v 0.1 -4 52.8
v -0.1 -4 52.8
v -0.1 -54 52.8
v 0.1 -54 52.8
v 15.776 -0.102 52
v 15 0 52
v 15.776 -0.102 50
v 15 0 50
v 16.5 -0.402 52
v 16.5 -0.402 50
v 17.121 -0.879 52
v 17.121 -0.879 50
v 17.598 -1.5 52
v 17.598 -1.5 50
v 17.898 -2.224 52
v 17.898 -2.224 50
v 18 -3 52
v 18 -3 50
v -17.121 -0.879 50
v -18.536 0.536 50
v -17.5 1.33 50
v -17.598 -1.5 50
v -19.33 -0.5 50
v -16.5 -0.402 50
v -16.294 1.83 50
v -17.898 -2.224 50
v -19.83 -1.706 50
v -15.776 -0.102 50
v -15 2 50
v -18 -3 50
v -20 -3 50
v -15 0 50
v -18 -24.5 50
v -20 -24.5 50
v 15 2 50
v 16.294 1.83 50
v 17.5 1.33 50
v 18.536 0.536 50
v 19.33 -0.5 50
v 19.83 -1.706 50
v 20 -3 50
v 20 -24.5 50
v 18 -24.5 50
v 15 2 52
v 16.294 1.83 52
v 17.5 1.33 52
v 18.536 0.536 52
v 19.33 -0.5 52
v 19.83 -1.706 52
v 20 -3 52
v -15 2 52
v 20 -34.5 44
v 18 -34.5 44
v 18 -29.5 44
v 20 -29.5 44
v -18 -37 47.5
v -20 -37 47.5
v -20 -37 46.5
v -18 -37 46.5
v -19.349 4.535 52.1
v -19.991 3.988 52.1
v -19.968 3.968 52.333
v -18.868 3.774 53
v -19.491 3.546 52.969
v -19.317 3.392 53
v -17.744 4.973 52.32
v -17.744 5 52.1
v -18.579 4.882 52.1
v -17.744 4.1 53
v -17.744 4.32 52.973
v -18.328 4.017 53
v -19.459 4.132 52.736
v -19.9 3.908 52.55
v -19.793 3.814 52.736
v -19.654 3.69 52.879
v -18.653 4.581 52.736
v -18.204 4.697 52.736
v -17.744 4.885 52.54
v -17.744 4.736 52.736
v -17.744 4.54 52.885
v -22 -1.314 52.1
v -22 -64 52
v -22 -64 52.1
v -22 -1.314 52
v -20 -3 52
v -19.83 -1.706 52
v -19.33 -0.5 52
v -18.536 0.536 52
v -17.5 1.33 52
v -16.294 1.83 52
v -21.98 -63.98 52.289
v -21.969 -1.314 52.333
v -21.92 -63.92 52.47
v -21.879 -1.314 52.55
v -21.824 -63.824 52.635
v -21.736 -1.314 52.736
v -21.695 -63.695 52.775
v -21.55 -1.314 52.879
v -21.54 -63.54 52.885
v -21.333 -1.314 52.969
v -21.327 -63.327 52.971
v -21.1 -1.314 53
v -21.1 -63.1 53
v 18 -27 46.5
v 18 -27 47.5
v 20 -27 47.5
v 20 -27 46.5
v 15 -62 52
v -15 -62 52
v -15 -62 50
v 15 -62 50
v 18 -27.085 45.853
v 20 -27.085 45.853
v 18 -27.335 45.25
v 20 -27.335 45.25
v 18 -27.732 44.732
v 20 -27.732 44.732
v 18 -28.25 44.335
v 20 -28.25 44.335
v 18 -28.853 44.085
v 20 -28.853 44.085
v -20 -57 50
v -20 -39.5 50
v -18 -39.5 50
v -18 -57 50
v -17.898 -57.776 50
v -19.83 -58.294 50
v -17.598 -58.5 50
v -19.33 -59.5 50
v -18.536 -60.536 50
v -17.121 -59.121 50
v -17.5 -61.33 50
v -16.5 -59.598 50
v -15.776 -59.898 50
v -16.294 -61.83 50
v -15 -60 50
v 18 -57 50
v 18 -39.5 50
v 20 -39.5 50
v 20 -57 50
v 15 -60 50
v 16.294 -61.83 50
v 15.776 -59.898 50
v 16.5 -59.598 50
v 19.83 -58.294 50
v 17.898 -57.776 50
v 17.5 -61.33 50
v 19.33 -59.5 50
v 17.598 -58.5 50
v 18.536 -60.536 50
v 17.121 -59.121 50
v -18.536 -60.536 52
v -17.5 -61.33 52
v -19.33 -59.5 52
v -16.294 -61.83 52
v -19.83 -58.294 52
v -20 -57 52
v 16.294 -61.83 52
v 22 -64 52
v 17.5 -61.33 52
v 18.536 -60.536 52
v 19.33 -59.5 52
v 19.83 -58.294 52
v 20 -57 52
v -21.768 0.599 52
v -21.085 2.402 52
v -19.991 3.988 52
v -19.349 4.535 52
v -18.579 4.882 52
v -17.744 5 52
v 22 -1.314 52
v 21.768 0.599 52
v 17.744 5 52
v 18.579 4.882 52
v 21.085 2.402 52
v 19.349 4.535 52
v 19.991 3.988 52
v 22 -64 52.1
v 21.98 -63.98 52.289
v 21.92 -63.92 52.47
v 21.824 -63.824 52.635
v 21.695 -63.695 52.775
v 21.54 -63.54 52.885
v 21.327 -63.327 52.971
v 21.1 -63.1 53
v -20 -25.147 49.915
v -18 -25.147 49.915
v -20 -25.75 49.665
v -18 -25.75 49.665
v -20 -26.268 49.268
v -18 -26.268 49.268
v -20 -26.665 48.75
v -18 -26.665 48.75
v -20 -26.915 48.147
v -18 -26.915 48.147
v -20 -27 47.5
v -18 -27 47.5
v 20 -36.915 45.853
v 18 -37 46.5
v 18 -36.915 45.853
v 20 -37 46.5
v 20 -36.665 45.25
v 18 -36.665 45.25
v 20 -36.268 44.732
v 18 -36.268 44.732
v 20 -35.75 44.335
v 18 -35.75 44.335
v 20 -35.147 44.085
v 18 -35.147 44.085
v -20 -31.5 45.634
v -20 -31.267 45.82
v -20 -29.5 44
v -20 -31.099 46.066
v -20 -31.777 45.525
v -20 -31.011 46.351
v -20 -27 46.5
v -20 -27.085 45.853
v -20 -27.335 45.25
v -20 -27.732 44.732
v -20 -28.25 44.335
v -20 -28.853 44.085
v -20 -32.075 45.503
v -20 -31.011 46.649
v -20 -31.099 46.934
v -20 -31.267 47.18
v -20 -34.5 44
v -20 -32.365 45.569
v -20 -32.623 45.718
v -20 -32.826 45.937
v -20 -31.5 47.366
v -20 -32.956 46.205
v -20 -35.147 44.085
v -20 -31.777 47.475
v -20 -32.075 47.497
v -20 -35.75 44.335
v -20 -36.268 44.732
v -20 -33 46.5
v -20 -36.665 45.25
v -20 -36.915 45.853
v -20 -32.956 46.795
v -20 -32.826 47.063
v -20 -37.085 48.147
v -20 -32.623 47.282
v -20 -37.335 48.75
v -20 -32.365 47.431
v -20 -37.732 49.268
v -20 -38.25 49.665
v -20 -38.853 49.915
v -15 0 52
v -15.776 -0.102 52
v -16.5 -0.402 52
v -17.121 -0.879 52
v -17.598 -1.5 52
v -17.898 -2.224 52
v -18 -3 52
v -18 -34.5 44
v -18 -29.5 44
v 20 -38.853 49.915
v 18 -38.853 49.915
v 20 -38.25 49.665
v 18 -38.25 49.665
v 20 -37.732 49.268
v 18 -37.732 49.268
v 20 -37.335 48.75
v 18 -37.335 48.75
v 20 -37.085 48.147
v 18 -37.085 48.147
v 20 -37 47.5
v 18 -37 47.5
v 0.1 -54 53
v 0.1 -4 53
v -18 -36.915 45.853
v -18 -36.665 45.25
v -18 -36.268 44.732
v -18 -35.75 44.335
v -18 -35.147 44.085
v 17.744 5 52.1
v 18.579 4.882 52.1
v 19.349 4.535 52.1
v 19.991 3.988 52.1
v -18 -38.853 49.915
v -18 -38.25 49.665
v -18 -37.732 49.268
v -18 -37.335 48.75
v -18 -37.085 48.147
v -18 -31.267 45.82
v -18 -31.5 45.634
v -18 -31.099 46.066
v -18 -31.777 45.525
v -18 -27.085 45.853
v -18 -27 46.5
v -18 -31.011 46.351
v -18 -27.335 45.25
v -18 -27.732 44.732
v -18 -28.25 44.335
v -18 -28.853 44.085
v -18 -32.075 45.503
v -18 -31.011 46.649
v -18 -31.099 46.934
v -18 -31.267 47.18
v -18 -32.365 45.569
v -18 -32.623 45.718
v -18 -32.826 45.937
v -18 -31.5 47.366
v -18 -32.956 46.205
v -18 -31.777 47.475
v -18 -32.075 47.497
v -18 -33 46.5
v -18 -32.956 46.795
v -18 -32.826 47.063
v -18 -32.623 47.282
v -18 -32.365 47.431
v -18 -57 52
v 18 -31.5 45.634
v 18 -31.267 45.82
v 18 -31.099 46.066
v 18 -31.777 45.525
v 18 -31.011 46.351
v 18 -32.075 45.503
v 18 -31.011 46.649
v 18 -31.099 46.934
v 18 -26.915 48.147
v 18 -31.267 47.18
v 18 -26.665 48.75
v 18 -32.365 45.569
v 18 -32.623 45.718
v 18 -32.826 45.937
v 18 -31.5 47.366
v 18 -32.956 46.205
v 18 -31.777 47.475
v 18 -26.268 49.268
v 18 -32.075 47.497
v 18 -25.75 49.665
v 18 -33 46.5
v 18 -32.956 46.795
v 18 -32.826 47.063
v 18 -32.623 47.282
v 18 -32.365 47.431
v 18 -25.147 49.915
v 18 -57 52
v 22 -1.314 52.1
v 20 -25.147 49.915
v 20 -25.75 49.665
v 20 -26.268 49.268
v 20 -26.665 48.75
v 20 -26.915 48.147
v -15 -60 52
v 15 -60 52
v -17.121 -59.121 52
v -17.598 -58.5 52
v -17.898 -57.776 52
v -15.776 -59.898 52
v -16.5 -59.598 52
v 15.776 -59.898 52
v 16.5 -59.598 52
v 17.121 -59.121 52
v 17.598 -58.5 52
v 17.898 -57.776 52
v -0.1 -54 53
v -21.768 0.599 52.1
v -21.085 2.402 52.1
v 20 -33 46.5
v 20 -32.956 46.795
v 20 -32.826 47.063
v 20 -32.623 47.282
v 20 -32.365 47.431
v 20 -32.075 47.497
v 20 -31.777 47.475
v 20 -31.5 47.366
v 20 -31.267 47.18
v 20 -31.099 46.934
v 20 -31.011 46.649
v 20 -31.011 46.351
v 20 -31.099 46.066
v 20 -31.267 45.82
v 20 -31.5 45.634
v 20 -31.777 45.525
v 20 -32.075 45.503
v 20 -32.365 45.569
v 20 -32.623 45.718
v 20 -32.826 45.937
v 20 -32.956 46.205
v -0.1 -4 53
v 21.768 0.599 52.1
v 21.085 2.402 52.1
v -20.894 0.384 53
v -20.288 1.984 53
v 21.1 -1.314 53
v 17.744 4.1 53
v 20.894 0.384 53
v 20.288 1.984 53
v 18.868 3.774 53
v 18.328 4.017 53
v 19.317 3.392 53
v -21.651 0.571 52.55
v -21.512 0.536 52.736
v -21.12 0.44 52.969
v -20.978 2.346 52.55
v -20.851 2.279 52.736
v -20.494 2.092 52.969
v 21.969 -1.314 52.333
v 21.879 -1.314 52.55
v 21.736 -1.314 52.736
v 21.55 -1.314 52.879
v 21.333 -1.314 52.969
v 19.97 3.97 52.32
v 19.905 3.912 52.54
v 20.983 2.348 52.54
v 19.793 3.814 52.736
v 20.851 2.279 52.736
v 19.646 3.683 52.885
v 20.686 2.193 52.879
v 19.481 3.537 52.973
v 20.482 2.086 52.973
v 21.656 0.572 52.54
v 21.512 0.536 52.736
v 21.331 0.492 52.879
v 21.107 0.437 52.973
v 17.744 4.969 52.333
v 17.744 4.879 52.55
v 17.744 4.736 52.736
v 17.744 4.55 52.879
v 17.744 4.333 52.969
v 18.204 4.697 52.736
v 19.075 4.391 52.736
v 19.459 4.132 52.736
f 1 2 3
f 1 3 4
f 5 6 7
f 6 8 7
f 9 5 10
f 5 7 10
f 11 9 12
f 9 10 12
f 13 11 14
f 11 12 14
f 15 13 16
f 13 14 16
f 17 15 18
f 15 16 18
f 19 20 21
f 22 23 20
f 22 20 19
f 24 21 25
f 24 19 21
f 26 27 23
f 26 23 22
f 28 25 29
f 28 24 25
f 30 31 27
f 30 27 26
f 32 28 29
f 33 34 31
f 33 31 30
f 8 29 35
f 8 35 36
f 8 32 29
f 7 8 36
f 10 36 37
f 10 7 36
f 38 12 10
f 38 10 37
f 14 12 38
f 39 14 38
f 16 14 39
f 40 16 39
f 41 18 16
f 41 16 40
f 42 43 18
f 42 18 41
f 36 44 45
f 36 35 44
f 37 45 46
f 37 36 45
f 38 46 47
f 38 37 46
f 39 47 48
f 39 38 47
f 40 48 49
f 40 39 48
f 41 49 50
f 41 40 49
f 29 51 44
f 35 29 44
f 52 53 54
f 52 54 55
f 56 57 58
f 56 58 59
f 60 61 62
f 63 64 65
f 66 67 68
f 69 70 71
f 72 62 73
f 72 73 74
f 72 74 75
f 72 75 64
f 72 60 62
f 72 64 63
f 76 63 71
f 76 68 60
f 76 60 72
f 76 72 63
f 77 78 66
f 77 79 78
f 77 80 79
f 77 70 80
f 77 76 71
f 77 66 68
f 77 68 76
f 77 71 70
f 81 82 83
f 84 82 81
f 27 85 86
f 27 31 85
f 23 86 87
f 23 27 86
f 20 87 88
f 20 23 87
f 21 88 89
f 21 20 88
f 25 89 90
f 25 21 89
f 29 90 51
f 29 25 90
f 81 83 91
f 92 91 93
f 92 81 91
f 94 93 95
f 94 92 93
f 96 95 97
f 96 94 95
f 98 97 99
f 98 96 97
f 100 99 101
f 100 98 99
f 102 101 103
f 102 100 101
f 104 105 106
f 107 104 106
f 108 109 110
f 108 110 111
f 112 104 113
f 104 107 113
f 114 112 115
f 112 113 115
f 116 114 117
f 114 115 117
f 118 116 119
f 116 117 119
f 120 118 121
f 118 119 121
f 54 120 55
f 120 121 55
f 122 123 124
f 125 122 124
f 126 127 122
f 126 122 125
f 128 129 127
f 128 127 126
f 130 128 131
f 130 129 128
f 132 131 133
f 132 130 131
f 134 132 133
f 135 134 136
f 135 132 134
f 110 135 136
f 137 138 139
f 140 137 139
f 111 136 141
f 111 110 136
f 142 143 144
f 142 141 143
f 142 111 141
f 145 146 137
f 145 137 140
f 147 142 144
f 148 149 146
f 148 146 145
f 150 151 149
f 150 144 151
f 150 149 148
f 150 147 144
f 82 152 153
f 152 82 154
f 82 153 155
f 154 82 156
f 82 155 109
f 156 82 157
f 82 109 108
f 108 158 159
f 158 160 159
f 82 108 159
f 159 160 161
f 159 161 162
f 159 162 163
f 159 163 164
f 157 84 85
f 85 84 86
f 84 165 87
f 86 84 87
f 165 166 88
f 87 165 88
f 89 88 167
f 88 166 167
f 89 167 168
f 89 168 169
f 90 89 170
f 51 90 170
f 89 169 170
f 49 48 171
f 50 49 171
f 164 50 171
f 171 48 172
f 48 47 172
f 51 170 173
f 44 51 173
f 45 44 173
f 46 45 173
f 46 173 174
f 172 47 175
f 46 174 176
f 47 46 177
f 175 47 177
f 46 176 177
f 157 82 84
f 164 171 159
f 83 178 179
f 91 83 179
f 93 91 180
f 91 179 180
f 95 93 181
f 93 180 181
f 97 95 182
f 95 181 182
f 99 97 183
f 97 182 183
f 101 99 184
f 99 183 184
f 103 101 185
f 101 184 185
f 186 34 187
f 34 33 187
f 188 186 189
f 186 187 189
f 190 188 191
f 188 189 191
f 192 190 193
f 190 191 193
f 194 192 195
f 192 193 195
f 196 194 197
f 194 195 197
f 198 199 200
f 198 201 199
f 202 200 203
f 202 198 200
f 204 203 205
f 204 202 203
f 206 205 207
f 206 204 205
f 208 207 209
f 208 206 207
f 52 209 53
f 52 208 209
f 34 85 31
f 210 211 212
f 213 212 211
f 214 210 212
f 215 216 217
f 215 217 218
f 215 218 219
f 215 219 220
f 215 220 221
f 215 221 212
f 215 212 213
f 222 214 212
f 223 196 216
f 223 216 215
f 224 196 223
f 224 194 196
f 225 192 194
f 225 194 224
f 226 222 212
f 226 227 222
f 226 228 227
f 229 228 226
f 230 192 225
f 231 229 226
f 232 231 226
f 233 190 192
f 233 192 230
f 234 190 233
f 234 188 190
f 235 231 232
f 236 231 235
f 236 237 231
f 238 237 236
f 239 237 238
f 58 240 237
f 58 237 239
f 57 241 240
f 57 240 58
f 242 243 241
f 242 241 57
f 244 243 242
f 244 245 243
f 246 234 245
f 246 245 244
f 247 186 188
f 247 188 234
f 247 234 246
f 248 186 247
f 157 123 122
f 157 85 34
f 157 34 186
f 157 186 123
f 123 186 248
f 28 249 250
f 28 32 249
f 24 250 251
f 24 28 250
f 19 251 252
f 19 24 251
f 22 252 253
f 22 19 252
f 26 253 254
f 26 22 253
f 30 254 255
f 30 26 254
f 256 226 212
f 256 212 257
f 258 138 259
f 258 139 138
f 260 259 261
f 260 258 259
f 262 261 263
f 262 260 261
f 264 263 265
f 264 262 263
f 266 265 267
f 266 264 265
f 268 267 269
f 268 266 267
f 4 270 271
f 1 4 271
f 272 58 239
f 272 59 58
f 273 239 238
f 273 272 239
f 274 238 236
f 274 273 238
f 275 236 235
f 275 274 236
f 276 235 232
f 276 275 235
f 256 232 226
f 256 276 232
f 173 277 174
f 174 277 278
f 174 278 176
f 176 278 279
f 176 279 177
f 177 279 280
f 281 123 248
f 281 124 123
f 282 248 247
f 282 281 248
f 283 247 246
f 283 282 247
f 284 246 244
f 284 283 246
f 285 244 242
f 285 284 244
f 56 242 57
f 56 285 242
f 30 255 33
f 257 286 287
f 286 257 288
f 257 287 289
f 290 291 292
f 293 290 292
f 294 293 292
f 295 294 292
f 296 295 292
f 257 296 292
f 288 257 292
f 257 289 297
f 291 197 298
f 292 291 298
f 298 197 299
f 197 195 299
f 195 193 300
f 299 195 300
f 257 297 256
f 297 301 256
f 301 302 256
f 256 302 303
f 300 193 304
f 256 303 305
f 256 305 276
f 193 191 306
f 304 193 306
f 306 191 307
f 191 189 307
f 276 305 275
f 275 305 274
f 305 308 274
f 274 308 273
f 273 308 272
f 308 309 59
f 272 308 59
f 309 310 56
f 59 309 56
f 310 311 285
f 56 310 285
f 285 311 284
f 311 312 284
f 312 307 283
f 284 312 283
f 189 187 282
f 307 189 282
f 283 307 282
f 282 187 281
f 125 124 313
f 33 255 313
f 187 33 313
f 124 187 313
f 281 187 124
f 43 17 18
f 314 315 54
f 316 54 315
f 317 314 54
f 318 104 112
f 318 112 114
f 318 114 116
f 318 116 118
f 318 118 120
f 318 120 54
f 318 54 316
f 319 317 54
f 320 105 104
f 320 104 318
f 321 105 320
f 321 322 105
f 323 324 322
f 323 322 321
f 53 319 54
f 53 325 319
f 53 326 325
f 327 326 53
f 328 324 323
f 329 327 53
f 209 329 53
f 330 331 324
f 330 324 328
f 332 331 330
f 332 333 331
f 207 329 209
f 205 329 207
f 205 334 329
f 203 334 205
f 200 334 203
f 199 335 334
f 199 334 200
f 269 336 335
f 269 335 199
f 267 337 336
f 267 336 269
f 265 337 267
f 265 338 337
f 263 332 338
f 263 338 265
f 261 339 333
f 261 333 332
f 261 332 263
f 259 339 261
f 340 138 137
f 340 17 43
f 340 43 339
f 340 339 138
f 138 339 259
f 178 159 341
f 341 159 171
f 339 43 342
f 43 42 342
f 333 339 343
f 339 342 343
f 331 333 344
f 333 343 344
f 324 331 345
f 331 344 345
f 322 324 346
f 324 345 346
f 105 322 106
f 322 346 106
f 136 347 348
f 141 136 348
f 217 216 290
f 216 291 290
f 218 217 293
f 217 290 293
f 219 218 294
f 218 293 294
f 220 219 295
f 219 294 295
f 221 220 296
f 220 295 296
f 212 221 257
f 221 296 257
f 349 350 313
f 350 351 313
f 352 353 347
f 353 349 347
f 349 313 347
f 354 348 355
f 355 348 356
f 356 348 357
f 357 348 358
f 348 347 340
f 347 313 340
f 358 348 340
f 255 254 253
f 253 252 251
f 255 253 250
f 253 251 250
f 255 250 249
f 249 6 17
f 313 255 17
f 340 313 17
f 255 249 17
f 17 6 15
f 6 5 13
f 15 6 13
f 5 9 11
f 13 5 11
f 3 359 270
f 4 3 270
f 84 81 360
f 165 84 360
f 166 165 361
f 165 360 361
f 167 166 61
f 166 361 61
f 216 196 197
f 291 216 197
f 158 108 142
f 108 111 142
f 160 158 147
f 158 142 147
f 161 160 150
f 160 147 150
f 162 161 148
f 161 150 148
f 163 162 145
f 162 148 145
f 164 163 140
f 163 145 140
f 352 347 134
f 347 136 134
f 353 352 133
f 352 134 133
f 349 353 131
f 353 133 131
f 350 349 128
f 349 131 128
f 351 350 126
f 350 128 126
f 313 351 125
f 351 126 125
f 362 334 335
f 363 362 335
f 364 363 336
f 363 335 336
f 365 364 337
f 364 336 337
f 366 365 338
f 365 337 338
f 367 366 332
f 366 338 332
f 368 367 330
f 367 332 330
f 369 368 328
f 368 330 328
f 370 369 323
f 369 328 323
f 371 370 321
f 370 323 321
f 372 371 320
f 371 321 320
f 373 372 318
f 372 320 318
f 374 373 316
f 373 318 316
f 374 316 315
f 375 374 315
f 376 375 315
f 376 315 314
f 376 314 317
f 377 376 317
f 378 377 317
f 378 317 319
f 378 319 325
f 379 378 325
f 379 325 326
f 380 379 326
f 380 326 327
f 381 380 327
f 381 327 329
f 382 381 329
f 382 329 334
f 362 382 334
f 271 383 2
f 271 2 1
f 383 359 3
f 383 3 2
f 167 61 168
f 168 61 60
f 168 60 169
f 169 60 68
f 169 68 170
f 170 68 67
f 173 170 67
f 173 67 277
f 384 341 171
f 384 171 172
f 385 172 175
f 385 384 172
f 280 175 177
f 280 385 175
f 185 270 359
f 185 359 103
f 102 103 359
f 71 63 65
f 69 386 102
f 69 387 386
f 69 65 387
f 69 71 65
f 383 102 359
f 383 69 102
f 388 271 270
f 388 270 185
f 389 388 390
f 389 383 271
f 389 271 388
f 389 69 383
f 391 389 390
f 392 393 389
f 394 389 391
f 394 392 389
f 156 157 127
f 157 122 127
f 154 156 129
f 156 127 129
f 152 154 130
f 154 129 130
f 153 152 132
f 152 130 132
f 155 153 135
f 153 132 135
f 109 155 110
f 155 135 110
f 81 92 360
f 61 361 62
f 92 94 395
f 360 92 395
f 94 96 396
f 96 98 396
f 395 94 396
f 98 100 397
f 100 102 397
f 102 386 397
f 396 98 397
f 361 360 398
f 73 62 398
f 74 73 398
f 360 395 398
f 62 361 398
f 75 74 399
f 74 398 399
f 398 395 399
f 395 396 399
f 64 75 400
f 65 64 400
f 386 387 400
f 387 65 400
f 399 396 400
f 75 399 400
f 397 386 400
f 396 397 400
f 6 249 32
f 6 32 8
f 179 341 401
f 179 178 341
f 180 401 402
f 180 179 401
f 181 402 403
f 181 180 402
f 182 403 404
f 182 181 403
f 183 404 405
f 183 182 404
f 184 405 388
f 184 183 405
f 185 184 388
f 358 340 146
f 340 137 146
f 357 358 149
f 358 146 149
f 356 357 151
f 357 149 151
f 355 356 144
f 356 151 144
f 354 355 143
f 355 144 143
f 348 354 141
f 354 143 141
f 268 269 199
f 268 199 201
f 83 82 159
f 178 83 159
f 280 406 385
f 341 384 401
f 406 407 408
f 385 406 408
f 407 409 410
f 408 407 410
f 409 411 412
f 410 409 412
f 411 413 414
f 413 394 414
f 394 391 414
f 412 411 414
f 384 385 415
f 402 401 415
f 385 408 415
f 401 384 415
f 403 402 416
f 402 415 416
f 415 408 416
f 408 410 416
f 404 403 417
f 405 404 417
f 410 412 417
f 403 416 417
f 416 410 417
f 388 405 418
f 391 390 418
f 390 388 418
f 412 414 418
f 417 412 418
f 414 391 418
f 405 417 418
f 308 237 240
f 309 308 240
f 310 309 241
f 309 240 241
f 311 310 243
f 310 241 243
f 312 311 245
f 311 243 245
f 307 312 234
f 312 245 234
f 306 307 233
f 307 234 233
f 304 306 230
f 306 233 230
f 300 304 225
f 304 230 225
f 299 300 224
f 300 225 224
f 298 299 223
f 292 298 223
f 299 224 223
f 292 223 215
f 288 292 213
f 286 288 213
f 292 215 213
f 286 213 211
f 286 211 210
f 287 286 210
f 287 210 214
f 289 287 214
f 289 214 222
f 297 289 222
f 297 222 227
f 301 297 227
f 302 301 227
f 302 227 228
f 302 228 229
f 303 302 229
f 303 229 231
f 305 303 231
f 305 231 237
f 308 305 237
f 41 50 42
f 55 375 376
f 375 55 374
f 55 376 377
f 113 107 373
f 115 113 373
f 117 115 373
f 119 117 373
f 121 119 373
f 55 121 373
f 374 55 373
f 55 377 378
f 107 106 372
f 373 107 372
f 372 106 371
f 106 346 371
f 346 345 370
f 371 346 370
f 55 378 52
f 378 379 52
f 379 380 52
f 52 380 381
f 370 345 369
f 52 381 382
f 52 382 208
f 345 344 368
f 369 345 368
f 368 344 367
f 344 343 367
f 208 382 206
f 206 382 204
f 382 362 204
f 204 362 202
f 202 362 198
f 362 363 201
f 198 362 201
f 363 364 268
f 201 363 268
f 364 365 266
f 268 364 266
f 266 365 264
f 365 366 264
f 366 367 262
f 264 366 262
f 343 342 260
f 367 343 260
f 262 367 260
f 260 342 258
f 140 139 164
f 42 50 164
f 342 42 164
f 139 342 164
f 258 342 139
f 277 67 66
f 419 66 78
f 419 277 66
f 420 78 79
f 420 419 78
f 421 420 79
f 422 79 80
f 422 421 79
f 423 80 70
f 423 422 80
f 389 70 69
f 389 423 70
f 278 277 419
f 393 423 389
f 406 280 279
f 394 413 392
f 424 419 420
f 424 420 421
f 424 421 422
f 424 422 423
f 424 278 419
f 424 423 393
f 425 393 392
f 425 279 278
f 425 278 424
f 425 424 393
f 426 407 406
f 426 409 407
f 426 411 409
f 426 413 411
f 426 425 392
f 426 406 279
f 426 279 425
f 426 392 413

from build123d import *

# Parameters (mm, degrees)
SKETCH013_W     = 44
SKETCH013_H     = 69
PAD006_DEPTH    = 1
SKETCH014_W     = 40
SKETCH014_H     = 64
SKETCH014_W_2   = 36
SKETCH014_H_2   = 60
PAD007_DEPTH    = 2
FILLET005_R     = 3
FILLET006_R     = 5
CHAMFER002_SIZE = 3
FILLET007_R     = 8
FILLET008_R     = 3
FILLET009_R     = 0.9
SKETCH015_W     = 2
SKETCH015_H     = 10
PAD008_DEPTH    = 6
FILLET011_R     = 2.5
SKETCH016_R     = 1
POCKET002_DEPTH = 41
SKETCH024_W     = 0.2
SKETCH024_H     = 50
POCKET007_DEPTH = 0.2


with BuildPart() as part:
    # Sketch013 → Pad006 (new body)
    with BuildSketch(Plane.XY):
        with Locations((0, 2.5)):
            Rectangle(SKETCH013_W, SKETCH013_H)
    extrude(amount=PAD006_DEPTH)

    # Sketch014 (on Face5 of Pad006) → Pad007 (join)
    with BuildSketch(Plane(origin=(0, 0, 0), x_dir=(1, 0, 0), z_dir=(0, 0, -1))):
        with Locations((0, -2)):
            Rectangle(SKETCH014_W, SKETCH014_H)
        with Locations((0, -2)):
            Rectangle(SKETCH014_W_2, SKETCH014_H_2, mode=Mode.SUBTRACT)
    extrude(amount=PAD007_DEPTH)

    # Fillet005
    fillet005_edges = [part.edges().sort_by_distance(p)[0] for p in [
        (18, 32, -1),
        (-18, 32, -1),
        (-18, -28, -1),
        (18, -28, -1),
    ]]
    fillet(fillet005_edges, radius=FILLET005_R)

    # Fillet006
    fillet006_edges = [part.edges().sort_by_distance(p)[0] for p in [
        (20, -30, -1),
        (-20, -30, -1),
        (-20, 34, -1),
        (20, 34, -1),
    ]]
    fillet(fillet006_edges, radius=FILLET006_R)

    # Chamfer002
    chamfer002_edges = [part.edges().sort_by_distance(p)[0] for p in [
        (22, 37, 0.5),
        (-22, 37, 0.5),
    ]]
    chamfer(chamfer002_edges, length=CHAMFER002_SIZE)

    # Fillet007
    fillet007_edges = [part.edges().sort_by_distance(p)[0] for p in [
        (-22, 34, 0.5),
        (22, 34, 0.5),
    ]]
    fillet(fillet007_edges, radius=FILLET007_R)

    # Fillet008
    fillet008_edges = [part.edges().sort_by_distance(p)[0] for p in [
        (-19, 37, 0.5),
        (19, 37, 0.5),
    ]]
    fillet(fillet008_edges, radius=FILLET008_R)

    # Fillet009
    fillet009_edges = [part.edges().sort_by_distance(p)[0] for p in [
        (-21.480851, 33.521227, 1),
        (-18.976175, 36.735386, 1),
        (-22, -0.656854, 1),
        (0, 37, 1),
        (0, -32, 1),
        (18.976175, 36.735386, 1),
        (22, -0.656854, 1),
        (21.480851, 33.521227, 1),
    ]]
    fillet(fillet009_edges, radius=FILLET009_R)

    # Sketch015 (on Face27 of Fillet009) → Pad008 (join)
    with BuildSketch(Plane(origin=(0, 0, -2), x_dir=(1, 0, 0), z_dir=(0, 0, -1))):
        with Locations((-19, 0)):
            Rectangle(SKETCH015_W, SKETCH015_H)
        with Locations((19, 0)):
            Rectangle(SKETCH015_W, SKETCH015_H)
    extrude(amount=PAD008_DEPTH)

    # Fillet011
    fillet011_edges = [part.edges().sort_by_distance(p)[0] for p in [
        (-19, -5, -2),
        (-19, -5, -8),
        (19, -5, -2),
        (19, -5, -8),
        (-19, 5, -8),
        (-19, 5, -2),
        (19, 5, -8),
        (19, 5, -2),
    ]]
    fillet(fillet011_edges, radius=FILLET011_R)

    # Sketch016 (on Face3 of Fillet011) → Pocket002 (cut)
    with BuildSketch(Plane(origin=(-20, 0, 0), x_dir=(0, -1, 0), z_dir=(-1, 0, 0))):
        with Locations((0, -5.5)):
            Circle(SKETCH016_R)
    extrude(amount=-POCKET002_DEPTH, mode=Mode.SUBTRACT)

    # Sketch024 (on Face57 of Pocket002) → Pocket007 (cut)
    with BuildSketch(Plane.XY.offset(1)):
        with Locations((0, 3)):
            Rectangle(SKETCH024_W, SKETCH024_H)
    extrude(amount=-POCKET007_DEPTH, mode=Mode.SUBTRACT)


with BuildPart() as part_1:
    # Body003 placement: moved
    add(part.part.moved(Location((0, -32, 52))))


solid = part_1.part
